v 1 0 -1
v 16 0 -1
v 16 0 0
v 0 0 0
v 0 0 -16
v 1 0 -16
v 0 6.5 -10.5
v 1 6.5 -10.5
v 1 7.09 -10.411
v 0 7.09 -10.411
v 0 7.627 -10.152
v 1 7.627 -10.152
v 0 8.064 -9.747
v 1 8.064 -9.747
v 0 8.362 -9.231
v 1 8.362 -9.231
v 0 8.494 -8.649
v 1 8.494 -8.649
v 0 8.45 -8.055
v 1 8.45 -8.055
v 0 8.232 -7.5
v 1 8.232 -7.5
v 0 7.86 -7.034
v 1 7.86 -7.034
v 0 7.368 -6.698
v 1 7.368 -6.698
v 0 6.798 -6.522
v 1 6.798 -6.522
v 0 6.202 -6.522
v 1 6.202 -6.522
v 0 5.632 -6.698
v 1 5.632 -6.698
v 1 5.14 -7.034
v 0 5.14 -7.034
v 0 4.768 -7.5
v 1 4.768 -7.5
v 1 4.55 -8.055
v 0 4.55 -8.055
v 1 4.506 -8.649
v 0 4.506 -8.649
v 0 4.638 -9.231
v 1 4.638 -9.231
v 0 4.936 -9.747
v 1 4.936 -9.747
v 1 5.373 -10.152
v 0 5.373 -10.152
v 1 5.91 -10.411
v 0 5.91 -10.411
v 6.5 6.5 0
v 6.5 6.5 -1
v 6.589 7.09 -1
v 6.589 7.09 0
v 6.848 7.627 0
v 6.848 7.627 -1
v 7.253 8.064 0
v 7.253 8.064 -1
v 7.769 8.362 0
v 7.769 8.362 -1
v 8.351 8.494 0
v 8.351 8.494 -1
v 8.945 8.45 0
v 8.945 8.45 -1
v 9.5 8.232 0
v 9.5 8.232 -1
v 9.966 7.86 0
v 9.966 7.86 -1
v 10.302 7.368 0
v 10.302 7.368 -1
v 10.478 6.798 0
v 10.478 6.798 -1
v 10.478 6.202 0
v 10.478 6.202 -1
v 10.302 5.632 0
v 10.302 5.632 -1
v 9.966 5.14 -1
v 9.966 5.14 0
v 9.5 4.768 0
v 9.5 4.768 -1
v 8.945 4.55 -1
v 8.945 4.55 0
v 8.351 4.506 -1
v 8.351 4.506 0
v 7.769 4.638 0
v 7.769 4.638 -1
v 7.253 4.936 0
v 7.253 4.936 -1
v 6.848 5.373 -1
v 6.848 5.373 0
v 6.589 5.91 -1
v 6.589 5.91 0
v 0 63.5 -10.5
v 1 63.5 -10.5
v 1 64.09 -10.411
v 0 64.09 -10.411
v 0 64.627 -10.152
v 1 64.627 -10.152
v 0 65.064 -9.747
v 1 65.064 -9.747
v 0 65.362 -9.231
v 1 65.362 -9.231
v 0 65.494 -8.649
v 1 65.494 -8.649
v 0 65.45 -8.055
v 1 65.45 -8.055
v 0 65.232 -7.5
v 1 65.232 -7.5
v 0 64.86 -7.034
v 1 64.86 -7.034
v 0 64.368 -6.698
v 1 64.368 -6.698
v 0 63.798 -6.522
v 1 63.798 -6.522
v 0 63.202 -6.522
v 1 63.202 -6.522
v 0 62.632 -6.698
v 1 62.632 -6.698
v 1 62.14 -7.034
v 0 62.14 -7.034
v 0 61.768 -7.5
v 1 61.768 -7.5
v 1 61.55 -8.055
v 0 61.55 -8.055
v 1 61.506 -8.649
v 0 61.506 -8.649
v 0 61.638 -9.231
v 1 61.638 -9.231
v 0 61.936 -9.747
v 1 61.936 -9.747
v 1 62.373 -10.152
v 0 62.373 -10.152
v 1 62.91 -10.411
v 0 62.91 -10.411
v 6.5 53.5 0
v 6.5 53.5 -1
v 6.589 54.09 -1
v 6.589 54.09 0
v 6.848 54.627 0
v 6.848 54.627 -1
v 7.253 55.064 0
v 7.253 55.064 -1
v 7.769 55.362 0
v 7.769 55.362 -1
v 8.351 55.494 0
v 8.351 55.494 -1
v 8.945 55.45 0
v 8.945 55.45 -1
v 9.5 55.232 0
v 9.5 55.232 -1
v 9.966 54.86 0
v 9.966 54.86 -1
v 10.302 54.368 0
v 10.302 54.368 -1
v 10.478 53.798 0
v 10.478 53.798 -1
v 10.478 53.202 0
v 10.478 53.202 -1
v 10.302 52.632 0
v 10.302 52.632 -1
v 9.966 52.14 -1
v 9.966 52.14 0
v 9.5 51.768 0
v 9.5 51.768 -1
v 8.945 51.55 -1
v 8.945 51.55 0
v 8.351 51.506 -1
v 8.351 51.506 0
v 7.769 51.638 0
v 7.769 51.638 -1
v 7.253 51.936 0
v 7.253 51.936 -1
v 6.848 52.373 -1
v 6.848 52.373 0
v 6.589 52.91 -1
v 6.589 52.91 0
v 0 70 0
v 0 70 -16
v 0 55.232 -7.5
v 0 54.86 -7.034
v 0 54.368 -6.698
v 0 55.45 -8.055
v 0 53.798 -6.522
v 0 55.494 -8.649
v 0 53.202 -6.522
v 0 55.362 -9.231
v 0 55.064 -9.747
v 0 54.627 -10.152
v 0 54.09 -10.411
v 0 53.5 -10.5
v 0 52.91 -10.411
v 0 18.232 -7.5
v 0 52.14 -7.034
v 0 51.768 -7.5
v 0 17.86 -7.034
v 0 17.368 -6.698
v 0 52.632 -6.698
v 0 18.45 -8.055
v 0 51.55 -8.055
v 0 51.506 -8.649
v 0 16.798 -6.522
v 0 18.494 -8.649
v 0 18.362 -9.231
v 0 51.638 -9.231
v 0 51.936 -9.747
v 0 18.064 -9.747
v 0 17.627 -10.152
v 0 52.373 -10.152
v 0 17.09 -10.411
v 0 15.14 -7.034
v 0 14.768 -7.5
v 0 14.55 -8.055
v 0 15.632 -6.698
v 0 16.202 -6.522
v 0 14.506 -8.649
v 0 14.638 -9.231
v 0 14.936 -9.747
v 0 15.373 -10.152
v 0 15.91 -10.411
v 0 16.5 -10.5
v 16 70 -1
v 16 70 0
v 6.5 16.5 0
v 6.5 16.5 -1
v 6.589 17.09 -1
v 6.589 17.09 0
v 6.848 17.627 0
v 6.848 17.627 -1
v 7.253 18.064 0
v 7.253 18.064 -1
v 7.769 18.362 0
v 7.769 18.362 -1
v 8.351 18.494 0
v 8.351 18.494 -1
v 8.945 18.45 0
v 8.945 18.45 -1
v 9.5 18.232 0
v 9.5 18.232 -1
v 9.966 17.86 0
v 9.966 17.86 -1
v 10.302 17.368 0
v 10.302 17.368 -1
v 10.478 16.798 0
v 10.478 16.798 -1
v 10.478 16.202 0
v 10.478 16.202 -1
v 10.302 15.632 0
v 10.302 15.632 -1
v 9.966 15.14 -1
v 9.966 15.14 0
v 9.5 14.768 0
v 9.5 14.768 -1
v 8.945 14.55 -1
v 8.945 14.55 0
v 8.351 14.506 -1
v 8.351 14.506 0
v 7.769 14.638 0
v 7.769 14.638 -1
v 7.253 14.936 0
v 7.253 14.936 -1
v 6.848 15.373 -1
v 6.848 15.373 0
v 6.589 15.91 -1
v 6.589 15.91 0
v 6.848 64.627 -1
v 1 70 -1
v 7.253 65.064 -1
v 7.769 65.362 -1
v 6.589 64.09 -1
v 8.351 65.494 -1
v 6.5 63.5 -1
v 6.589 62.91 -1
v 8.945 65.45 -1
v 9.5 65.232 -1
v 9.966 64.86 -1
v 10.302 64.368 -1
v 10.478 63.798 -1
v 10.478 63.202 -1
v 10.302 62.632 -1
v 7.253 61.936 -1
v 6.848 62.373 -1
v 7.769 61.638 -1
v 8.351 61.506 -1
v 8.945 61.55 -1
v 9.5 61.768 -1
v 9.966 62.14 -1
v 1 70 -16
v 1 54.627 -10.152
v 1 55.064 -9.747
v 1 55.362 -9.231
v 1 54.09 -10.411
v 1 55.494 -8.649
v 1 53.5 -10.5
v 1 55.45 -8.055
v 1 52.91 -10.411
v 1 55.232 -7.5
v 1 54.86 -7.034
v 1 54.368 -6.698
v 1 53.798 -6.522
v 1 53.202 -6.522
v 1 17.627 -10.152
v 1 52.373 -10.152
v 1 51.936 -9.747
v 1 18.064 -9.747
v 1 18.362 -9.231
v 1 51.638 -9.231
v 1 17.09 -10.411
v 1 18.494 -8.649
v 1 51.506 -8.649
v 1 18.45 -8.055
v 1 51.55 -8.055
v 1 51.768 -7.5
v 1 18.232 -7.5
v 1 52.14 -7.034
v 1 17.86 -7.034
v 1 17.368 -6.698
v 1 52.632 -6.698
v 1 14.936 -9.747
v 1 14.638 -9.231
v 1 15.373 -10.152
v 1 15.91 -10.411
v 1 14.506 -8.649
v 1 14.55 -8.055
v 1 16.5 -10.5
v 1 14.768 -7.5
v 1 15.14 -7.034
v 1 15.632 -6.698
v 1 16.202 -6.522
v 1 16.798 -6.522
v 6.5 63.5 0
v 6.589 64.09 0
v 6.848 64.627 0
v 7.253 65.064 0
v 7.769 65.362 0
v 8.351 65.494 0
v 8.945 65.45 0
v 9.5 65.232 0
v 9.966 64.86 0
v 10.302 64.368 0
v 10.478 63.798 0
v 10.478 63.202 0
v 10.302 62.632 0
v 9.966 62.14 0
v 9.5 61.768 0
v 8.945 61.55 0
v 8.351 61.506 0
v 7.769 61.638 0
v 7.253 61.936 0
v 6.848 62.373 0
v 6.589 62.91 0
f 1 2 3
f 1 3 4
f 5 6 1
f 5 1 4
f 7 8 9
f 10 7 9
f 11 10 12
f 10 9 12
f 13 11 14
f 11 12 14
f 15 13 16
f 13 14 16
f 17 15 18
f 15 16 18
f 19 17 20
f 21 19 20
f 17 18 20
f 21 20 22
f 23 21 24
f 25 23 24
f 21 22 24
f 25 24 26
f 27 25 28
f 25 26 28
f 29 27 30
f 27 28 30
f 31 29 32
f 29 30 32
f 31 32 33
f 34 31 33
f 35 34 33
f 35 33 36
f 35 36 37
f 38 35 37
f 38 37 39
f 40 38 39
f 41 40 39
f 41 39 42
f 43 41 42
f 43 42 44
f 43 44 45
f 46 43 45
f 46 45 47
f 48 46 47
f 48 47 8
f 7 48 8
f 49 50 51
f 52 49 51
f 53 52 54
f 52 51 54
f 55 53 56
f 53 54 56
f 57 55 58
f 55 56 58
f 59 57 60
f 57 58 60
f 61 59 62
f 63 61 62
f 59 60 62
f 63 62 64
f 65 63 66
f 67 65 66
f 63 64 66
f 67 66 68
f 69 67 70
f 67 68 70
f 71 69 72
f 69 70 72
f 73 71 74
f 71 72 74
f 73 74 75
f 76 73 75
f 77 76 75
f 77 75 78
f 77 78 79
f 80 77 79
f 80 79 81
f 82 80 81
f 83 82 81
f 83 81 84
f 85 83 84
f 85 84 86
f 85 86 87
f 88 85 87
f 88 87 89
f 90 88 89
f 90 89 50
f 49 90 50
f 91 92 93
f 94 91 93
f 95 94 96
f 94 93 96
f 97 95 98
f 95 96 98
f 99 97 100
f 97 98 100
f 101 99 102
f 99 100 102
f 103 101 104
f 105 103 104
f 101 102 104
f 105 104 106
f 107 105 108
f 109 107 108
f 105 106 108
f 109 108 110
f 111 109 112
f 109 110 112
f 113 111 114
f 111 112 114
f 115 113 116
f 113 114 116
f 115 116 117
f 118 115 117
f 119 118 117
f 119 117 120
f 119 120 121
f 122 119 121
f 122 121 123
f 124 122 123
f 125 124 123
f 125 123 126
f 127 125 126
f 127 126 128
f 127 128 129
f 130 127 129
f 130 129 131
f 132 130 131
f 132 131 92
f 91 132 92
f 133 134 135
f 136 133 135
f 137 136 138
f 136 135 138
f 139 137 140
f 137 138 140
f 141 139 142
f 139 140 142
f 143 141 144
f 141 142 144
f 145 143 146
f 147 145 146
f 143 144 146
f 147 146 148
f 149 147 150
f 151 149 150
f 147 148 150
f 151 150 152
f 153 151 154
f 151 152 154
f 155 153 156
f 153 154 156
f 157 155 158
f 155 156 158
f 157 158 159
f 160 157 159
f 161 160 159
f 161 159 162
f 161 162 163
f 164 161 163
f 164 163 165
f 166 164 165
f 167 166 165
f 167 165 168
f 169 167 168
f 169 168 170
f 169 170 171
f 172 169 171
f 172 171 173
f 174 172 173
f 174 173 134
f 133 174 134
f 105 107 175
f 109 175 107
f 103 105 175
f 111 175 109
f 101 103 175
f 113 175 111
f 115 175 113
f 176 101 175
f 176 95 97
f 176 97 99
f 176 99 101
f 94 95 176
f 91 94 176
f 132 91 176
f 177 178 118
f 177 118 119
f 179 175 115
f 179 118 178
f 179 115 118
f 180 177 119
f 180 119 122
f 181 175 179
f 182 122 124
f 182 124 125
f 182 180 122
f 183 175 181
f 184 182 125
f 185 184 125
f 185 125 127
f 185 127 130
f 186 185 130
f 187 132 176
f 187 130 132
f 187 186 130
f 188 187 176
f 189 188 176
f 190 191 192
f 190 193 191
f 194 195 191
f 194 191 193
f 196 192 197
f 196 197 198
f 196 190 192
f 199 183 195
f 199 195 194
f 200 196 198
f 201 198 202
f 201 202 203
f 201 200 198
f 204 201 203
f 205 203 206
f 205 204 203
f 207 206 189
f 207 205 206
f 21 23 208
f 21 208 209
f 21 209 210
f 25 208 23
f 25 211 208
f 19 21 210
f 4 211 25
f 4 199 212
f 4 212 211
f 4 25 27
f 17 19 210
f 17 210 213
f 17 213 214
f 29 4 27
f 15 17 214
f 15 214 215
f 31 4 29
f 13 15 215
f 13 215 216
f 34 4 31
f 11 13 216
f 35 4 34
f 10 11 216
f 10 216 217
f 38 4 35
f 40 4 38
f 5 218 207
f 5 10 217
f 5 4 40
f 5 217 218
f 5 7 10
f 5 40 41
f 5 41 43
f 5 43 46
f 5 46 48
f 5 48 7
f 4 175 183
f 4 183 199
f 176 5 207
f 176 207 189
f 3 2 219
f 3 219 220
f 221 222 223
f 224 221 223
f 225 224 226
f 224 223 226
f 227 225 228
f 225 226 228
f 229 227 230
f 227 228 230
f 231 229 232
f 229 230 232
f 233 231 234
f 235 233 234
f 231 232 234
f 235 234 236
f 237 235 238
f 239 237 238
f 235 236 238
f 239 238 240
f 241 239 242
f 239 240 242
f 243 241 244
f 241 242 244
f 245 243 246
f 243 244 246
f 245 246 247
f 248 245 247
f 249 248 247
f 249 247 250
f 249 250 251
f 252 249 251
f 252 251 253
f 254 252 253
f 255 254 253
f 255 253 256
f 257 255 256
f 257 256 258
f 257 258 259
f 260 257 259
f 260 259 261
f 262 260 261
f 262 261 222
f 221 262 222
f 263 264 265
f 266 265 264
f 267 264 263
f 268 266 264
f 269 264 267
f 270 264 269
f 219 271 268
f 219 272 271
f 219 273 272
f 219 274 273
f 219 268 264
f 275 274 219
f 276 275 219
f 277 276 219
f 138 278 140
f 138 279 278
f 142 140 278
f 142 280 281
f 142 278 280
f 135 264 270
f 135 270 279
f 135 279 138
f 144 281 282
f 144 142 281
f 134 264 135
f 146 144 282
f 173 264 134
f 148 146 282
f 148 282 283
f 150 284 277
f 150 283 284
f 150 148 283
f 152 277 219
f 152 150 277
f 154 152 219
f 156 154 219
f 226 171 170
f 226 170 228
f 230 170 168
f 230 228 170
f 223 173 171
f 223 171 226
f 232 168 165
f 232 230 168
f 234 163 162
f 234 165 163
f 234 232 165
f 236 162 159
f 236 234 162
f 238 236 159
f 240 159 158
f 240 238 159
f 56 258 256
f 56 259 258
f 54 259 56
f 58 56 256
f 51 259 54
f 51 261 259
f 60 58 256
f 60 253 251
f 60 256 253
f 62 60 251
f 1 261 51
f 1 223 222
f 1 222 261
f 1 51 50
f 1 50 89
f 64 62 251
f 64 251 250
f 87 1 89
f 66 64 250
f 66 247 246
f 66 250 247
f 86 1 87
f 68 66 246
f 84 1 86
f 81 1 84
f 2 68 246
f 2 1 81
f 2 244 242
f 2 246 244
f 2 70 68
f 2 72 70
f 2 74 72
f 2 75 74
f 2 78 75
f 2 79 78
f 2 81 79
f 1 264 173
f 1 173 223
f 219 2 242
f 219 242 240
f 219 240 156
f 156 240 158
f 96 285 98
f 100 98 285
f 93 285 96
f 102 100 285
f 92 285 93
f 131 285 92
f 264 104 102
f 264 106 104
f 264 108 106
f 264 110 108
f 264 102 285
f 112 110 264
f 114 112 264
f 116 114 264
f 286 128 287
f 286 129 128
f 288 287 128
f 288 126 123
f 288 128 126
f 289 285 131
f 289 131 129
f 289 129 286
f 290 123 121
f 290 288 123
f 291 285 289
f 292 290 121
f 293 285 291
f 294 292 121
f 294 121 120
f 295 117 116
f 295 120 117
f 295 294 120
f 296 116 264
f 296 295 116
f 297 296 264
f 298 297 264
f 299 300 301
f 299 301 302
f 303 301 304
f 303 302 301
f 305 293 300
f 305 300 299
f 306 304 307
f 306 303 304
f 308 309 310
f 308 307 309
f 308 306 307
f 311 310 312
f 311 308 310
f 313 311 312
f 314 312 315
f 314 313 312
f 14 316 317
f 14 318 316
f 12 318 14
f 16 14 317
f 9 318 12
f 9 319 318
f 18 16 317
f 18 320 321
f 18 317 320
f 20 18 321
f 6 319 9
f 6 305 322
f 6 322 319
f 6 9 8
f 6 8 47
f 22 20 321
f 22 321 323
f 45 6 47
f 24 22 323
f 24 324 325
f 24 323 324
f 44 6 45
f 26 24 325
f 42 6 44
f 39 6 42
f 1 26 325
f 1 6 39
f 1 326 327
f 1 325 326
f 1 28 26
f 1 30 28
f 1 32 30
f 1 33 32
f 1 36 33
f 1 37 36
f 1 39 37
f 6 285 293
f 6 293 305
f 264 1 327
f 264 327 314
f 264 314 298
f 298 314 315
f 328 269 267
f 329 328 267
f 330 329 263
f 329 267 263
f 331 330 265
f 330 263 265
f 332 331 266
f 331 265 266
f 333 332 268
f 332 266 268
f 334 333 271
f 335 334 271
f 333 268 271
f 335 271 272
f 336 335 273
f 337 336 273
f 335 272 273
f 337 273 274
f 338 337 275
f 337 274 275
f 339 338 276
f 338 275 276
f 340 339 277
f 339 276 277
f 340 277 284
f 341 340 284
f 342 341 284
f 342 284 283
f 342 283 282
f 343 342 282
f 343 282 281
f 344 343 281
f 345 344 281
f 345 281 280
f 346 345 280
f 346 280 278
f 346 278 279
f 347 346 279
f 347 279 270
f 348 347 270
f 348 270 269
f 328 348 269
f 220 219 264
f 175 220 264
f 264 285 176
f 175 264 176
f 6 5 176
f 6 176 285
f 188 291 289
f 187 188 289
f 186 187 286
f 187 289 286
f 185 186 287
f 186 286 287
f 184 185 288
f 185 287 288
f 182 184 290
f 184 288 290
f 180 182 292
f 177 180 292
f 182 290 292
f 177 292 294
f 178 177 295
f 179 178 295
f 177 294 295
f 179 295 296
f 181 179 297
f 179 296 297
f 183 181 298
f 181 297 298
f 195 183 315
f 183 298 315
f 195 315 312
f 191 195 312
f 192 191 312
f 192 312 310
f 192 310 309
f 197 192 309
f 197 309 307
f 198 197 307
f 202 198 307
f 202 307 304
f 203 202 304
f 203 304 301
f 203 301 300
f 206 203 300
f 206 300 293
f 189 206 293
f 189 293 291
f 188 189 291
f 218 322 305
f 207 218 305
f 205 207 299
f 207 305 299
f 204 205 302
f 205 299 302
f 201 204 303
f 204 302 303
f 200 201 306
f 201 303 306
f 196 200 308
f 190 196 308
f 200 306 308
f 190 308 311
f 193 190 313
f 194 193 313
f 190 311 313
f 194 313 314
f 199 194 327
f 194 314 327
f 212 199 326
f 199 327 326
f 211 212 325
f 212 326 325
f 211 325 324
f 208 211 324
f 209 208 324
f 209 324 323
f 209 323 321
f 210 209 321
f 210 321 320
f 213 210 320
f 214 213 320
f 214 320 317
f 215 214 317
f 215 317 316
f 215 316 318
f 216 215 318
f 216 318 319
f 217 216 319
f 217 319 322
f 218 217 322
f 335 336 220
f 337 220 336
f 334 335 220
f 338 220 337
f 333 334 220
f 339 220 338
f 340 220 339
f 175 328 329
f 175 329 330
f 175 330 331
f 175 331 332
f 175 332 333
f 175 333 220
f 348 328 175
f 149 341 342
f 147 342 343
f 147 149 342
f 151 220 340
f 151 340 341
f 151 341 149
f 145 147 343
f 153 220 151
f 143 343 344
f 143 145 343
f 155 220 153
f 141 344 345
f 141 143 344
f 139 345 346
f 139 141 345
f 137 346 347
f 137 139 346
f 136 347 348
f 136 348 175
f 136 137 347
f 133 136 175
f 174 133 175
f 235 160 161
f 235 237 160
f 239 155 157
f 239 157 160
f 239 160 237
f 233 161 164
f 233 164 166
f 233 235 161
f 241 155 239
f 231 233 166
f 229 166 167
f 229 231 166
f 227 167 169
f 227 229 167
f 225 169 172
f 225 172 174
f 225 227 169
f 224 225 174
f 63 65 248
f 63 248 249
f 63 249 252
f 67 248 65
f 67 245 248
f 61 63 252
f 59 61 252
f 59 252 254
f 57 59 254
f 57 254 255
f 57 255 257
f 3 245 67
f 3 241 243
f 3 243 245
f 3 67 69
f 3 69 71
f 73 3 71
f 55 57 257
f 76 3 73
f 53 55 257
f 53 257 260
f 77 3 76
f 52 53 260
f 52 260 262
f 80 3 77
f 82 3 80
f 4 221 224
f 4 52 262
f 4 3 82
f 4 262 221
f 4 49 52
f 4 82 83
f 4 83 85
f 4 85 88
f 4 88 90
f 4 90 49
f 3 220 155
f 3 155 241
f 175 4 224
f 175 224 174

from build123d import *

# Parameters (mm, degrees)
EXTRUSION1_DEPTH = 70
EXTRUSION2_REACH = 3
ESQUISSE2_R      = 2
EXTRUSION3_REACH = 3
ESQUISSE3_R      = 2


with BuildPart() as part:
    # Esquisse1 → Extrusion1 (new body)
    with BuildSketch(Plane(origin=(0, 0, 0), x_dir=(1, 0, 0), z_dir=(0, 1, 0))):
        Polygon((0, 0), (0, 16), (1, 16), (1, 1), (16, 1), (16, 0), align=None)
    extrude(amount=EXTRUSION1_DEPTH)

    # Esquisse2 → Extrusion2 (cut, up to next)
    with BuildSketch(Plane(origin=(1, 0, 0), x_dir=(0, 0, -1), z_dir=(1, 0, 0)), mode=Mode.PRIVATE) as extrusion2_sk1:
        with Locations((8.5, 16.5)):
            Circle(ESQUISSE2_R)
    extrusion2_tool1 = extrude(extrusion2_sk1.sketch, amount=-EXTRUSION2_REACH, mode=Mode.PRIVATE) & part.part
    add(extrusion2_tool1.solids().sort_by_distance((1, 16.5, -8.5))[0], mode=Mode.SUBTRACT)
    # Esquisse2 → Extrusion2 (cut, up to next)
    with BuildSketch(Plane(origin=(1, 0, 0), x_dir=(0, 0, -1), z_dir=(1, 0, 0)), mode=Mode.PRIVATE) as extrusion2_sk2:
        with Locations((8.5, 6.5)):
            Circle(ESQUISSE2_R)
    extrusion2_tool2 = extrude(extrusion2_sk2.sketch, amount=-EXTRUSION2_REACH, mode=Mode.PRIVATE) & part.part
    add(extrusion2_tool2.solids().sort_by_distance((1, 6.5, -8.5))[0], mode=Mode.SUBTRACT)
    # Esquisse2 → Extrusion2 (cut, up to next)
    with BuildSketch(Plane(origin=(1, 0, 0), x_dir=(0, 0, -1), z_dir=(1, 0, 0)), mode=Mode.PRIVATE) as extrusion2_sk3:
        with Locations((8.5, 53.5)):
            Circle(ESQUISSE2_R)
    extrusion2_tool3 = extrude(extrusion2_sk3.sketch, amount=-EXTRUSION2_REACH, mode=Mode.PRIVATE) & part.part
    add(extrusion2_tool3.solids().sort_by_distance((1, 53.5, -8.5))[0], mode=Mode.SUBTRACT)
    # Esquisse2 → Extrusion2 (cut, up to next)
    with BuildSketch(Plane(origin=(1, 0, 0), x_dir=(0, 0, -1), z_dir=(1, 0, 0)), mode=Mode.PRIVATE) as extrusion2_sk4:
        with Locations((8.5, 63.5)):
            Circle(ESQUISSE2_R)
    extrusion2_tool4 = extrude(extrusion2_sk4.sketch, amount=-EXTRUSION2_REACH, mode=Mode.PRIVATE) & part.part
    add(extrusion2_tool4.solids().sort_by_distance((1, 63.5, -8.5))[0], mode=Mode.SUBTRACT)

    # Esquisse3 → Extrusion3 (cut, up to next)
    with BuildSketch(Plane(origin=(0, 0, -1), x_dir=(-1, 0, 0), z_dir=(0, 0, -1)), mode=Mode.PRIVATE) as extrusion3_sk1:
        with Locations((-8.5, 53.5)):
            Circle(ESQUISSE3_R)
    extrusion3_tool1 = extrude(extrusion3_sk1.sketch, amount=-EXTRUSION3_REACH, mode=Mode.PRIVATE) & part.part
    add(extrusion3_tool1.solids().sort_by_distance((8.5, 53.5, -1))[0], mode=Mode.SUBTRACT)
    # Esquisse3 → Extrusion3 (cut, up to next)
    with BuildSketch(Plane(origin=(0, 0, -1), x_dir=(-1, 0, 0), z_dir=(0, 0, -1)), mode=Mode.PRIVATE) as extrusion3_sk2:
        with Locations((-8.5, 63.5)):
            Circle(ESQUISSE3_R)
    extrusion3_tool2 = extrude(extrusion3_sk2.sketch, amount=-EXTRUSION3_REACH, mode=Mode.PRIVATE) & part.part
    add(extrusion3_tool2.solids().sort_by_distance((8.5, 63.5, -1))[0], mode=Mode.SUBTRACT)
    # Esquisse3 → Extrusion3 (cut, up to next)
    with BuildSketch(Plane(origin=(0, 0, -1), x_dir=(-1, 0, 0), z_dir=(0, 0, -1)), mode=Mode.PRIVATE) as extrusion3_sk3:
        with Locations((-8.5, 6.5)):
            Circle(ESQUISSE3_R)
    extrusion3_tool3 = extrude(extrusion3_sk3.sketch, amount=-EXTRUSION3_REACH, mode=Mode.PRIVATE) & part.part
    add(extrusion3_tool3.solids().sort_by_distance((8.5, 6.5, -1))[0], mode=Mode.SUBTRACT)
    # Esquisse3 → Extrusion3 (cut, up to next)
    with BuildSketch(Plane(origin=(0, 0, -1), x_dir=(-1, 0, 0), z_dir=(0, 0, -1)), mode=Mode.PRIVATE) as extrusion3_sk4:
        with Locations((-8.5, 16.5)):
            Circle(ESQUISSE3_R)
    extrusion3_tool4 = extrude(extrusion3_sk4.sketch, amount=-EXTRUSION3_REACH, mode=Mode.PRIVATE) & part.part
    add(extrusion3_tool4.solids().sort_by_distance((8.5, 16.5, -1))[0], mode=Mode.SUBTRACT)


solid = part.part
